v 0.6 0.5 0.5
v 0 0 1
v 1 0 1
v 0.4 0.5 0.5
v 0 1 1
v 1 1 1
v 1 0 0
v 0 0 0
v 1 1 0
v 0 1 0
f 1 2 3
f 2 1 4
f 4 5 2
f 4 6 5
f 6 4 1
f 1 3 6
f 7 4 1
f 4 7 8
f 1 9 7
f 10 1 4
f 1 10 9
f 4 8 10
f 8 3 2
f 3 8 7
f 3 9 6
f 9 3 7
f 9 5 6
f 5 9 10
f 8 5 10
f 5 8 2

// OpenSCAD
polyhedron(
  points=[
    [0, 0, 0],
    [1, 0, 0],
    [0, 1, 0],
    [1, 1, 0],

    [0, 0, 1],
    [1, 0, 1],
    [0, 1, 1],
    [1, 1, 1],

    [0.4, 0.5, 0.5],
    [0.6, 0.5, 0.5],

    [0.4, 0.5, 0.5],
    [0.6, 0.5, 0.5],
  ],
  faces=[
    [5,4,10,11],
    [4,6,10],
    [6,7,11,10],
    [7,5,11],
    
    [0,1,9,8],
    [1,3,9],
    [3,2,8,9],
    [2,0,8],
    
    [4,5,1,0],
    [5,7,3,1],
    [7,6,2,3],
    [6,4,0,2],
  ]);
